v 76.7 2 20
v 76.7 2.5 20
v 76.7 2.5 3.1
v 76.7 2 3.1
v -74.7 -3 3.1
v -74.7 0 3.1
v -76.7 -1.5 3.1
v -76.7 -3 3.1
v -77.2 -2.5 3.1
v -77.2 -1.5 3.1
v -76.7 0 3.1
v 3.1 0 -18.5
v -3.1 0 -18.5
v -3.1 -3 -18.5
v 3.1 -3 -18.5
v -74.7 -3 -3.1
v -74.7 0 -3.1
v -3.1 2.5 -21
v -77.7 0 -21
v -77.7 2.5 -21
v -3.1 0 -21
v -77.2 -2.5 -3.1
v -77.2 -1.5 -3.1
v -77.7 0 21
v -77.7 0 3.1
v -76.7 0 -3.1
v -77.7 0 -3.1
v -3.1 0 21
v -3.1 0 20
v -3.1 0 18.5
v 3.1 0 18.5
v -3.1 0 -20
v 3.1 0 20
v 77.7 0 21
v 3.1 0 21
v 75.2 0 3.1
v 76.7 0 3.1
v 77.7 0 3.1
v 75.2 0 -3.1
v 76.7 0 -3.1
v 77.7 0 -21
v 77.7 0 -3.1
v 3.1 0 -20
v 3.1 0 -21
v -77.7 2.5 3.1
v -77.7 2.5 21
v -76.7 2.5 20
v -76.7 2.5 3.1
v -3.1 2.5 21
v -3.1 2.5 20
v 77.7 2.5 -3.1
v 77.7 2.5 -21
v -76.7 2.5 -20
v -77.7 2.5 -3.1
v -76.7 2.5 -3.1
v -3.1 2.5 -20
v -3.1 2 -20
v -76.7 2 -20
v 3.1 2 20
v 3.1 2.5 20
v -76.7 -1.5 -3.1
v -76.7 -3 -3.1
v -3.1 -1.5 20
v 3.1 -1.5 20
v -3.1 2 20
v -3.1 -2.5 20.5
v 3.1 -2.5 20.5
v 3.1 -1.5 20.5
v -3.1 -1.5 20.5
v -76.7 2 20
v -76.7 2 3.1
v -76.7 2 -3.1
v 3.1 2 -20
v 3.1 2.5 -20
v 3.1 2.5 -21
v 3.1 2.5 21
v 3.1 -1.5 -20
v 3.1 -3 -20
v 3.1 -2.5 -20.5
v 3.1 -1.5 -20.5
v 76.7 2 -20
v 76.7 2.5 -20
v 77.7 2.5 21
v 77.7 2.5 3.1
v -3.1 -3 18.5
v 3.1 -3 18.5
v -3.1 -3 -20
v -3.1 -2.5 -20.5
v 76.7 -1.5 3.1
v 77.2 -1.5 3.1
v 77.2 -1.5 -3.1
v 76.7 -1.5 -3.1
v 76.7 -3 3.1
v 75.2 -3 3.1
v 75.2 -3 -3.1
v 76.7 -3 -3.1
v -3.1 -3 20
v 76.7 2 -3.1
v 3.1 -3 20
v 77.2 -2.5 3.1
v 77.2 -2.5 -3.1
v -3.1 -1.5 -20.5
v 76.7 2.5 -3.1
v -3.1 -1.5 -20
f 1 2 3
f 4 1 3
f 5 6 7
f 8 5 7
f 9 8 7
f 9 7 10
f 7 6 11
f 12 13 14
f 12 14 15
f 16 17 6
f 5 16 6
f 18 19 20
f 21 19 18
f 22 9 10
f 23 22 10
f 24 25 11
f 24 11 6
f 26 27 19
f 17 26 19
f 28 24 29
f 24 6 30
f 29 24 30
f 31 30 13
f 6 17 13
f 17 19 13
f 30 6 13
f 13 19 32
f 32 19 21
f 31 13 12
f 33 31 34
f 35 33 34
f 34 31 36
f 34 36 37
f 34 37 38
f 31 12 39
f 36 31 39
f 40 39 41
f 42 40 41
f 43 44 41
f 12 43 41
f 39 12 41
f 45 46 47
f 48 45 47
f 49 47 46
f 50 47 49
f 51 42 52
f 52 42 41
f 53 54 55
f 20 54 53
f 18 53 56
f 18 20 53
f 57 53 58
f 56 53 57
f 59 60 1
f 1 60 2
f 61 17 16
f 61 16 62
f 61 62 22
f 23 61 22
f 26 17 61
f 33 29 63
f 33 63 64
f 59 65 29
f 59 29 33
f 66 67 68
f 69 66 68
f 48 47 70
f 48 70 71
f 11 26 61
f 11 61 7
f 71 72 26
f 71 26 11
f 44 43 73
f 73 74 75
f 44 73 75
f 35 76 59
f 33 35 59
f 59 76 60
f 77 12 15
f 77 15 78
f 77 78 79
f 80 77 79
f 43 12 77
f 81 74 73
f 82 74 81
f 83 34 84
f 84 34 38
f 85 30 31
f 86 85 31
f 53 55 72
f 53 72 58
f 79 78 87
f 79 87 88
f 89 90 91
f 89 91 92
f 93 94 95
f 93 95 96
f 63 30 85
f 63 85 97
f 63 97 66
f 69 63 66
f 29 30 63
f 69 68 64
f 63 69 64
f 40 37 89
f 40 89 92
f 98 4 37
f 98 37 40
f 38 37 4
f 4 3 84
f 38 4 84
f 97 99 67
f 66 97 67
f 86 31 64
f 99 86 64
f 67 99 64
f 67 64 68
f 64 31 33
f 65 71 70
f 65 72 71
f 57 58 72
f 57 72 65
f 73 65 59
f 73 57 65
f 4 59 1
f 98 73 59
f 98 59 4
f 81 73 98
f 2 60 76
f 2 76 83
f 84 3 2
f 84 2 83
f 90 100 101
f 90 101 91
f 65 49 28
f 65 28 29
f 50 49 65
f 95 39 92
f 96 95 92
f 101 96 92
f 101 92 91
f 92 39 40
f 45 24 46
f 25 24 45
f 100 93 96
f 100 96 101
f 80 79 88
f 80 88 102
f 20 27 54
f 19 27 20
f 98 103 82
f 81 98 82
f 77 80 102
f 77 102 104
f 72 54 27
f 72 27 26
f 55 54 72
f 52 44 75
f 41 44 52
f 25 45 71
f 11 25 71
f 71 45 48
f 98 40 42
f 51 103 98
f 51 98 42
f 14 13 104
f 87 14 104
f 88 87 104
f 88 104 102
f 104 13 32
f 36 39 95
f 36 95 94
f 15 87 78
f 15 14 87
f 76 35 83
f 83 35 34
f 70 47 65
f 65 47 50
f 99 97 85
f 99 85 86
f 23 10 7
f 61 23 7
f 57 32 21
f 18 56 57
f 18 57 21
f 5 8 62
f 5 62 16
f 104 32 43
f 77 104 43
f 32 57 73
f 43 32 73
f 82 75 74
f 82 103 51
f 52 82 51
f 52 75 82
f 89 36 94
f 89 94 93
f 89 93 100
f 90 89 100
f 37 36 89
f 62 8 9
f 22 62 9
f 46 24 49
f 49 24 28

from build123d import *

# Parameters (mm, degrees)
SKETCH_1_W          = 155.4
SKETCH_1_H          = 42
EXTRUDE_1_DEPTH     = 2.5
SKETCH_2_W          = 153.4
SKETCH_2_H          = 40
CUT_EXTRUDE_1_DEPTH = 0.5
SKETCH_3_W          = 1
SKETCH_3_H          = 6.2
SKETCH_3_W_2        = 6.2
SKETCH_3_H_2        = 1
CUT_EXTRUDE_2_DEPTH = 81.526641554
SKETCH_4_W          = 2
SKETCH_4_H          = 6.2
SKETCH_4_W_2        = 6.2
SKETCH_4_H_2        = 1.5
SKETCH_4_W_3        = 1.5
EXTRUDE_2_DEPTH     = 3
EXTRUDE_3_DEPTH     = 6.2
EXTRUDE_4_DEPTH     = 6.2


with BuildPart() as part:
    # Эскиз1 → Бобышка-Вытянуть1 (new body)
    with BuildSketch(Plane(origin=(0, 0, 0), x_dir=(1, 0, 0), z_dir=(0, 1, 0))):
        Rectangle(SKETCH_1_W, SKETCH_1_H)
    extrude(amount=EXTRUDE_1_DEPTH)

    # Эскиз2 → Вырез-Вытянуть1 (cut)
    with BuildSketch(Plane(origin=(0, 2.5, 0), x_dir=(1, 0, 0), z_dir=(0, 1, 0))):
        Rectangle(SKETCH_2_W, SKETCH_2_H)
    extrude(amount=-CUT_EXTRUDE_1_DEPTH, mode=Mode.SUBTRACT)

    # Эскиз3 → Вырез-Вытянуть2 (cut, through all)
    with BuildSketch(Plane(origin=(0, 2.5, 0), x_dir=(1, 0, 0), z_dir=(0, 1, 0))):
        with Locations((-77.2, 0)):
            Rectangle(SKETCH_3_W, SKETCH_3_H)
        with Locations((0, 20.5)):
            Rectangle(SKETCH_3_W_2, SKETCH_3_H_2)
        with Locations((0, -20.5)):
            Rectangle(SKETCH_3_W_2, SKETCH_3_H_2)
        with Locations((77.2, 0)):
            Rectangle(SKETCH_3_W, SKETCH_3_H)
    extrude(amount=-CUT_EXTRUDE_2_DEPTH, mode=Mode.SUBTRACT)

    # Эскиз4 → Бобышка-Вытянуть2 (add)
    with BuildSketch(Plane.XZ):
        with Locations((-75.7, 0)):
            Rectangle(SKETCH_4_W, SKETCH_4_H)
        with Locations((0, 19.25)):
            Rectangle(SKETCH_4_W_2, SKETCH_4_H_2)
        with Locations((0, -19.25)):
            Rectangle(SKETCH_4_W_2, SKETCH_4_H_2)
        with Locations((75.95, 0)):
            Rectangle(SKETCH_4_W_3, SKETCH_4_H)
    extrude(amount=EXTRUDE_2_DEPTH)

    # Эскиз6 → Бобышка-Вытянуть3 (add)
    with BuildSketch(Plane.XY.offset(3.1)):
        Polygon((-76.7, -3), (-77.2, -2.5), (-77.2, -1.5), (-76.6, -1.5), (-76.6, -3), align=None)
    extrude_3 = extrude(amount=-EXTRUDE_3_DEPTH)

    # Зеркальное отражение1: Бобышка-Вытянуть3 across plane
    add(extrude_3.mirror(Plane(origin=(0, 0, 0), x_dir=(0, 0, 1), z_dir=(1, 0, 0))))

    # Эскиз8 → Бобышка-Вытянуть4 (add)
    with BuildSketch(Plane(origin=(3.1, 0, 0), x_dir=(0, 0, -1), z_dir=(1, 0, 0))):
        Polygon((-20, -3), (-20.5, -2.5), (-20.5, -1.5), (-19.9, -1.5), (-19.9, -3), align=None)
    extrude_4 = extrude(amount=-EXTRUDE_4_DEPTH)

    # Зеркальное отражение2: Бобышка-Вытянуть4 across plane
    add(extrude_4.mirror(Plane.XY))


solid = part.part
